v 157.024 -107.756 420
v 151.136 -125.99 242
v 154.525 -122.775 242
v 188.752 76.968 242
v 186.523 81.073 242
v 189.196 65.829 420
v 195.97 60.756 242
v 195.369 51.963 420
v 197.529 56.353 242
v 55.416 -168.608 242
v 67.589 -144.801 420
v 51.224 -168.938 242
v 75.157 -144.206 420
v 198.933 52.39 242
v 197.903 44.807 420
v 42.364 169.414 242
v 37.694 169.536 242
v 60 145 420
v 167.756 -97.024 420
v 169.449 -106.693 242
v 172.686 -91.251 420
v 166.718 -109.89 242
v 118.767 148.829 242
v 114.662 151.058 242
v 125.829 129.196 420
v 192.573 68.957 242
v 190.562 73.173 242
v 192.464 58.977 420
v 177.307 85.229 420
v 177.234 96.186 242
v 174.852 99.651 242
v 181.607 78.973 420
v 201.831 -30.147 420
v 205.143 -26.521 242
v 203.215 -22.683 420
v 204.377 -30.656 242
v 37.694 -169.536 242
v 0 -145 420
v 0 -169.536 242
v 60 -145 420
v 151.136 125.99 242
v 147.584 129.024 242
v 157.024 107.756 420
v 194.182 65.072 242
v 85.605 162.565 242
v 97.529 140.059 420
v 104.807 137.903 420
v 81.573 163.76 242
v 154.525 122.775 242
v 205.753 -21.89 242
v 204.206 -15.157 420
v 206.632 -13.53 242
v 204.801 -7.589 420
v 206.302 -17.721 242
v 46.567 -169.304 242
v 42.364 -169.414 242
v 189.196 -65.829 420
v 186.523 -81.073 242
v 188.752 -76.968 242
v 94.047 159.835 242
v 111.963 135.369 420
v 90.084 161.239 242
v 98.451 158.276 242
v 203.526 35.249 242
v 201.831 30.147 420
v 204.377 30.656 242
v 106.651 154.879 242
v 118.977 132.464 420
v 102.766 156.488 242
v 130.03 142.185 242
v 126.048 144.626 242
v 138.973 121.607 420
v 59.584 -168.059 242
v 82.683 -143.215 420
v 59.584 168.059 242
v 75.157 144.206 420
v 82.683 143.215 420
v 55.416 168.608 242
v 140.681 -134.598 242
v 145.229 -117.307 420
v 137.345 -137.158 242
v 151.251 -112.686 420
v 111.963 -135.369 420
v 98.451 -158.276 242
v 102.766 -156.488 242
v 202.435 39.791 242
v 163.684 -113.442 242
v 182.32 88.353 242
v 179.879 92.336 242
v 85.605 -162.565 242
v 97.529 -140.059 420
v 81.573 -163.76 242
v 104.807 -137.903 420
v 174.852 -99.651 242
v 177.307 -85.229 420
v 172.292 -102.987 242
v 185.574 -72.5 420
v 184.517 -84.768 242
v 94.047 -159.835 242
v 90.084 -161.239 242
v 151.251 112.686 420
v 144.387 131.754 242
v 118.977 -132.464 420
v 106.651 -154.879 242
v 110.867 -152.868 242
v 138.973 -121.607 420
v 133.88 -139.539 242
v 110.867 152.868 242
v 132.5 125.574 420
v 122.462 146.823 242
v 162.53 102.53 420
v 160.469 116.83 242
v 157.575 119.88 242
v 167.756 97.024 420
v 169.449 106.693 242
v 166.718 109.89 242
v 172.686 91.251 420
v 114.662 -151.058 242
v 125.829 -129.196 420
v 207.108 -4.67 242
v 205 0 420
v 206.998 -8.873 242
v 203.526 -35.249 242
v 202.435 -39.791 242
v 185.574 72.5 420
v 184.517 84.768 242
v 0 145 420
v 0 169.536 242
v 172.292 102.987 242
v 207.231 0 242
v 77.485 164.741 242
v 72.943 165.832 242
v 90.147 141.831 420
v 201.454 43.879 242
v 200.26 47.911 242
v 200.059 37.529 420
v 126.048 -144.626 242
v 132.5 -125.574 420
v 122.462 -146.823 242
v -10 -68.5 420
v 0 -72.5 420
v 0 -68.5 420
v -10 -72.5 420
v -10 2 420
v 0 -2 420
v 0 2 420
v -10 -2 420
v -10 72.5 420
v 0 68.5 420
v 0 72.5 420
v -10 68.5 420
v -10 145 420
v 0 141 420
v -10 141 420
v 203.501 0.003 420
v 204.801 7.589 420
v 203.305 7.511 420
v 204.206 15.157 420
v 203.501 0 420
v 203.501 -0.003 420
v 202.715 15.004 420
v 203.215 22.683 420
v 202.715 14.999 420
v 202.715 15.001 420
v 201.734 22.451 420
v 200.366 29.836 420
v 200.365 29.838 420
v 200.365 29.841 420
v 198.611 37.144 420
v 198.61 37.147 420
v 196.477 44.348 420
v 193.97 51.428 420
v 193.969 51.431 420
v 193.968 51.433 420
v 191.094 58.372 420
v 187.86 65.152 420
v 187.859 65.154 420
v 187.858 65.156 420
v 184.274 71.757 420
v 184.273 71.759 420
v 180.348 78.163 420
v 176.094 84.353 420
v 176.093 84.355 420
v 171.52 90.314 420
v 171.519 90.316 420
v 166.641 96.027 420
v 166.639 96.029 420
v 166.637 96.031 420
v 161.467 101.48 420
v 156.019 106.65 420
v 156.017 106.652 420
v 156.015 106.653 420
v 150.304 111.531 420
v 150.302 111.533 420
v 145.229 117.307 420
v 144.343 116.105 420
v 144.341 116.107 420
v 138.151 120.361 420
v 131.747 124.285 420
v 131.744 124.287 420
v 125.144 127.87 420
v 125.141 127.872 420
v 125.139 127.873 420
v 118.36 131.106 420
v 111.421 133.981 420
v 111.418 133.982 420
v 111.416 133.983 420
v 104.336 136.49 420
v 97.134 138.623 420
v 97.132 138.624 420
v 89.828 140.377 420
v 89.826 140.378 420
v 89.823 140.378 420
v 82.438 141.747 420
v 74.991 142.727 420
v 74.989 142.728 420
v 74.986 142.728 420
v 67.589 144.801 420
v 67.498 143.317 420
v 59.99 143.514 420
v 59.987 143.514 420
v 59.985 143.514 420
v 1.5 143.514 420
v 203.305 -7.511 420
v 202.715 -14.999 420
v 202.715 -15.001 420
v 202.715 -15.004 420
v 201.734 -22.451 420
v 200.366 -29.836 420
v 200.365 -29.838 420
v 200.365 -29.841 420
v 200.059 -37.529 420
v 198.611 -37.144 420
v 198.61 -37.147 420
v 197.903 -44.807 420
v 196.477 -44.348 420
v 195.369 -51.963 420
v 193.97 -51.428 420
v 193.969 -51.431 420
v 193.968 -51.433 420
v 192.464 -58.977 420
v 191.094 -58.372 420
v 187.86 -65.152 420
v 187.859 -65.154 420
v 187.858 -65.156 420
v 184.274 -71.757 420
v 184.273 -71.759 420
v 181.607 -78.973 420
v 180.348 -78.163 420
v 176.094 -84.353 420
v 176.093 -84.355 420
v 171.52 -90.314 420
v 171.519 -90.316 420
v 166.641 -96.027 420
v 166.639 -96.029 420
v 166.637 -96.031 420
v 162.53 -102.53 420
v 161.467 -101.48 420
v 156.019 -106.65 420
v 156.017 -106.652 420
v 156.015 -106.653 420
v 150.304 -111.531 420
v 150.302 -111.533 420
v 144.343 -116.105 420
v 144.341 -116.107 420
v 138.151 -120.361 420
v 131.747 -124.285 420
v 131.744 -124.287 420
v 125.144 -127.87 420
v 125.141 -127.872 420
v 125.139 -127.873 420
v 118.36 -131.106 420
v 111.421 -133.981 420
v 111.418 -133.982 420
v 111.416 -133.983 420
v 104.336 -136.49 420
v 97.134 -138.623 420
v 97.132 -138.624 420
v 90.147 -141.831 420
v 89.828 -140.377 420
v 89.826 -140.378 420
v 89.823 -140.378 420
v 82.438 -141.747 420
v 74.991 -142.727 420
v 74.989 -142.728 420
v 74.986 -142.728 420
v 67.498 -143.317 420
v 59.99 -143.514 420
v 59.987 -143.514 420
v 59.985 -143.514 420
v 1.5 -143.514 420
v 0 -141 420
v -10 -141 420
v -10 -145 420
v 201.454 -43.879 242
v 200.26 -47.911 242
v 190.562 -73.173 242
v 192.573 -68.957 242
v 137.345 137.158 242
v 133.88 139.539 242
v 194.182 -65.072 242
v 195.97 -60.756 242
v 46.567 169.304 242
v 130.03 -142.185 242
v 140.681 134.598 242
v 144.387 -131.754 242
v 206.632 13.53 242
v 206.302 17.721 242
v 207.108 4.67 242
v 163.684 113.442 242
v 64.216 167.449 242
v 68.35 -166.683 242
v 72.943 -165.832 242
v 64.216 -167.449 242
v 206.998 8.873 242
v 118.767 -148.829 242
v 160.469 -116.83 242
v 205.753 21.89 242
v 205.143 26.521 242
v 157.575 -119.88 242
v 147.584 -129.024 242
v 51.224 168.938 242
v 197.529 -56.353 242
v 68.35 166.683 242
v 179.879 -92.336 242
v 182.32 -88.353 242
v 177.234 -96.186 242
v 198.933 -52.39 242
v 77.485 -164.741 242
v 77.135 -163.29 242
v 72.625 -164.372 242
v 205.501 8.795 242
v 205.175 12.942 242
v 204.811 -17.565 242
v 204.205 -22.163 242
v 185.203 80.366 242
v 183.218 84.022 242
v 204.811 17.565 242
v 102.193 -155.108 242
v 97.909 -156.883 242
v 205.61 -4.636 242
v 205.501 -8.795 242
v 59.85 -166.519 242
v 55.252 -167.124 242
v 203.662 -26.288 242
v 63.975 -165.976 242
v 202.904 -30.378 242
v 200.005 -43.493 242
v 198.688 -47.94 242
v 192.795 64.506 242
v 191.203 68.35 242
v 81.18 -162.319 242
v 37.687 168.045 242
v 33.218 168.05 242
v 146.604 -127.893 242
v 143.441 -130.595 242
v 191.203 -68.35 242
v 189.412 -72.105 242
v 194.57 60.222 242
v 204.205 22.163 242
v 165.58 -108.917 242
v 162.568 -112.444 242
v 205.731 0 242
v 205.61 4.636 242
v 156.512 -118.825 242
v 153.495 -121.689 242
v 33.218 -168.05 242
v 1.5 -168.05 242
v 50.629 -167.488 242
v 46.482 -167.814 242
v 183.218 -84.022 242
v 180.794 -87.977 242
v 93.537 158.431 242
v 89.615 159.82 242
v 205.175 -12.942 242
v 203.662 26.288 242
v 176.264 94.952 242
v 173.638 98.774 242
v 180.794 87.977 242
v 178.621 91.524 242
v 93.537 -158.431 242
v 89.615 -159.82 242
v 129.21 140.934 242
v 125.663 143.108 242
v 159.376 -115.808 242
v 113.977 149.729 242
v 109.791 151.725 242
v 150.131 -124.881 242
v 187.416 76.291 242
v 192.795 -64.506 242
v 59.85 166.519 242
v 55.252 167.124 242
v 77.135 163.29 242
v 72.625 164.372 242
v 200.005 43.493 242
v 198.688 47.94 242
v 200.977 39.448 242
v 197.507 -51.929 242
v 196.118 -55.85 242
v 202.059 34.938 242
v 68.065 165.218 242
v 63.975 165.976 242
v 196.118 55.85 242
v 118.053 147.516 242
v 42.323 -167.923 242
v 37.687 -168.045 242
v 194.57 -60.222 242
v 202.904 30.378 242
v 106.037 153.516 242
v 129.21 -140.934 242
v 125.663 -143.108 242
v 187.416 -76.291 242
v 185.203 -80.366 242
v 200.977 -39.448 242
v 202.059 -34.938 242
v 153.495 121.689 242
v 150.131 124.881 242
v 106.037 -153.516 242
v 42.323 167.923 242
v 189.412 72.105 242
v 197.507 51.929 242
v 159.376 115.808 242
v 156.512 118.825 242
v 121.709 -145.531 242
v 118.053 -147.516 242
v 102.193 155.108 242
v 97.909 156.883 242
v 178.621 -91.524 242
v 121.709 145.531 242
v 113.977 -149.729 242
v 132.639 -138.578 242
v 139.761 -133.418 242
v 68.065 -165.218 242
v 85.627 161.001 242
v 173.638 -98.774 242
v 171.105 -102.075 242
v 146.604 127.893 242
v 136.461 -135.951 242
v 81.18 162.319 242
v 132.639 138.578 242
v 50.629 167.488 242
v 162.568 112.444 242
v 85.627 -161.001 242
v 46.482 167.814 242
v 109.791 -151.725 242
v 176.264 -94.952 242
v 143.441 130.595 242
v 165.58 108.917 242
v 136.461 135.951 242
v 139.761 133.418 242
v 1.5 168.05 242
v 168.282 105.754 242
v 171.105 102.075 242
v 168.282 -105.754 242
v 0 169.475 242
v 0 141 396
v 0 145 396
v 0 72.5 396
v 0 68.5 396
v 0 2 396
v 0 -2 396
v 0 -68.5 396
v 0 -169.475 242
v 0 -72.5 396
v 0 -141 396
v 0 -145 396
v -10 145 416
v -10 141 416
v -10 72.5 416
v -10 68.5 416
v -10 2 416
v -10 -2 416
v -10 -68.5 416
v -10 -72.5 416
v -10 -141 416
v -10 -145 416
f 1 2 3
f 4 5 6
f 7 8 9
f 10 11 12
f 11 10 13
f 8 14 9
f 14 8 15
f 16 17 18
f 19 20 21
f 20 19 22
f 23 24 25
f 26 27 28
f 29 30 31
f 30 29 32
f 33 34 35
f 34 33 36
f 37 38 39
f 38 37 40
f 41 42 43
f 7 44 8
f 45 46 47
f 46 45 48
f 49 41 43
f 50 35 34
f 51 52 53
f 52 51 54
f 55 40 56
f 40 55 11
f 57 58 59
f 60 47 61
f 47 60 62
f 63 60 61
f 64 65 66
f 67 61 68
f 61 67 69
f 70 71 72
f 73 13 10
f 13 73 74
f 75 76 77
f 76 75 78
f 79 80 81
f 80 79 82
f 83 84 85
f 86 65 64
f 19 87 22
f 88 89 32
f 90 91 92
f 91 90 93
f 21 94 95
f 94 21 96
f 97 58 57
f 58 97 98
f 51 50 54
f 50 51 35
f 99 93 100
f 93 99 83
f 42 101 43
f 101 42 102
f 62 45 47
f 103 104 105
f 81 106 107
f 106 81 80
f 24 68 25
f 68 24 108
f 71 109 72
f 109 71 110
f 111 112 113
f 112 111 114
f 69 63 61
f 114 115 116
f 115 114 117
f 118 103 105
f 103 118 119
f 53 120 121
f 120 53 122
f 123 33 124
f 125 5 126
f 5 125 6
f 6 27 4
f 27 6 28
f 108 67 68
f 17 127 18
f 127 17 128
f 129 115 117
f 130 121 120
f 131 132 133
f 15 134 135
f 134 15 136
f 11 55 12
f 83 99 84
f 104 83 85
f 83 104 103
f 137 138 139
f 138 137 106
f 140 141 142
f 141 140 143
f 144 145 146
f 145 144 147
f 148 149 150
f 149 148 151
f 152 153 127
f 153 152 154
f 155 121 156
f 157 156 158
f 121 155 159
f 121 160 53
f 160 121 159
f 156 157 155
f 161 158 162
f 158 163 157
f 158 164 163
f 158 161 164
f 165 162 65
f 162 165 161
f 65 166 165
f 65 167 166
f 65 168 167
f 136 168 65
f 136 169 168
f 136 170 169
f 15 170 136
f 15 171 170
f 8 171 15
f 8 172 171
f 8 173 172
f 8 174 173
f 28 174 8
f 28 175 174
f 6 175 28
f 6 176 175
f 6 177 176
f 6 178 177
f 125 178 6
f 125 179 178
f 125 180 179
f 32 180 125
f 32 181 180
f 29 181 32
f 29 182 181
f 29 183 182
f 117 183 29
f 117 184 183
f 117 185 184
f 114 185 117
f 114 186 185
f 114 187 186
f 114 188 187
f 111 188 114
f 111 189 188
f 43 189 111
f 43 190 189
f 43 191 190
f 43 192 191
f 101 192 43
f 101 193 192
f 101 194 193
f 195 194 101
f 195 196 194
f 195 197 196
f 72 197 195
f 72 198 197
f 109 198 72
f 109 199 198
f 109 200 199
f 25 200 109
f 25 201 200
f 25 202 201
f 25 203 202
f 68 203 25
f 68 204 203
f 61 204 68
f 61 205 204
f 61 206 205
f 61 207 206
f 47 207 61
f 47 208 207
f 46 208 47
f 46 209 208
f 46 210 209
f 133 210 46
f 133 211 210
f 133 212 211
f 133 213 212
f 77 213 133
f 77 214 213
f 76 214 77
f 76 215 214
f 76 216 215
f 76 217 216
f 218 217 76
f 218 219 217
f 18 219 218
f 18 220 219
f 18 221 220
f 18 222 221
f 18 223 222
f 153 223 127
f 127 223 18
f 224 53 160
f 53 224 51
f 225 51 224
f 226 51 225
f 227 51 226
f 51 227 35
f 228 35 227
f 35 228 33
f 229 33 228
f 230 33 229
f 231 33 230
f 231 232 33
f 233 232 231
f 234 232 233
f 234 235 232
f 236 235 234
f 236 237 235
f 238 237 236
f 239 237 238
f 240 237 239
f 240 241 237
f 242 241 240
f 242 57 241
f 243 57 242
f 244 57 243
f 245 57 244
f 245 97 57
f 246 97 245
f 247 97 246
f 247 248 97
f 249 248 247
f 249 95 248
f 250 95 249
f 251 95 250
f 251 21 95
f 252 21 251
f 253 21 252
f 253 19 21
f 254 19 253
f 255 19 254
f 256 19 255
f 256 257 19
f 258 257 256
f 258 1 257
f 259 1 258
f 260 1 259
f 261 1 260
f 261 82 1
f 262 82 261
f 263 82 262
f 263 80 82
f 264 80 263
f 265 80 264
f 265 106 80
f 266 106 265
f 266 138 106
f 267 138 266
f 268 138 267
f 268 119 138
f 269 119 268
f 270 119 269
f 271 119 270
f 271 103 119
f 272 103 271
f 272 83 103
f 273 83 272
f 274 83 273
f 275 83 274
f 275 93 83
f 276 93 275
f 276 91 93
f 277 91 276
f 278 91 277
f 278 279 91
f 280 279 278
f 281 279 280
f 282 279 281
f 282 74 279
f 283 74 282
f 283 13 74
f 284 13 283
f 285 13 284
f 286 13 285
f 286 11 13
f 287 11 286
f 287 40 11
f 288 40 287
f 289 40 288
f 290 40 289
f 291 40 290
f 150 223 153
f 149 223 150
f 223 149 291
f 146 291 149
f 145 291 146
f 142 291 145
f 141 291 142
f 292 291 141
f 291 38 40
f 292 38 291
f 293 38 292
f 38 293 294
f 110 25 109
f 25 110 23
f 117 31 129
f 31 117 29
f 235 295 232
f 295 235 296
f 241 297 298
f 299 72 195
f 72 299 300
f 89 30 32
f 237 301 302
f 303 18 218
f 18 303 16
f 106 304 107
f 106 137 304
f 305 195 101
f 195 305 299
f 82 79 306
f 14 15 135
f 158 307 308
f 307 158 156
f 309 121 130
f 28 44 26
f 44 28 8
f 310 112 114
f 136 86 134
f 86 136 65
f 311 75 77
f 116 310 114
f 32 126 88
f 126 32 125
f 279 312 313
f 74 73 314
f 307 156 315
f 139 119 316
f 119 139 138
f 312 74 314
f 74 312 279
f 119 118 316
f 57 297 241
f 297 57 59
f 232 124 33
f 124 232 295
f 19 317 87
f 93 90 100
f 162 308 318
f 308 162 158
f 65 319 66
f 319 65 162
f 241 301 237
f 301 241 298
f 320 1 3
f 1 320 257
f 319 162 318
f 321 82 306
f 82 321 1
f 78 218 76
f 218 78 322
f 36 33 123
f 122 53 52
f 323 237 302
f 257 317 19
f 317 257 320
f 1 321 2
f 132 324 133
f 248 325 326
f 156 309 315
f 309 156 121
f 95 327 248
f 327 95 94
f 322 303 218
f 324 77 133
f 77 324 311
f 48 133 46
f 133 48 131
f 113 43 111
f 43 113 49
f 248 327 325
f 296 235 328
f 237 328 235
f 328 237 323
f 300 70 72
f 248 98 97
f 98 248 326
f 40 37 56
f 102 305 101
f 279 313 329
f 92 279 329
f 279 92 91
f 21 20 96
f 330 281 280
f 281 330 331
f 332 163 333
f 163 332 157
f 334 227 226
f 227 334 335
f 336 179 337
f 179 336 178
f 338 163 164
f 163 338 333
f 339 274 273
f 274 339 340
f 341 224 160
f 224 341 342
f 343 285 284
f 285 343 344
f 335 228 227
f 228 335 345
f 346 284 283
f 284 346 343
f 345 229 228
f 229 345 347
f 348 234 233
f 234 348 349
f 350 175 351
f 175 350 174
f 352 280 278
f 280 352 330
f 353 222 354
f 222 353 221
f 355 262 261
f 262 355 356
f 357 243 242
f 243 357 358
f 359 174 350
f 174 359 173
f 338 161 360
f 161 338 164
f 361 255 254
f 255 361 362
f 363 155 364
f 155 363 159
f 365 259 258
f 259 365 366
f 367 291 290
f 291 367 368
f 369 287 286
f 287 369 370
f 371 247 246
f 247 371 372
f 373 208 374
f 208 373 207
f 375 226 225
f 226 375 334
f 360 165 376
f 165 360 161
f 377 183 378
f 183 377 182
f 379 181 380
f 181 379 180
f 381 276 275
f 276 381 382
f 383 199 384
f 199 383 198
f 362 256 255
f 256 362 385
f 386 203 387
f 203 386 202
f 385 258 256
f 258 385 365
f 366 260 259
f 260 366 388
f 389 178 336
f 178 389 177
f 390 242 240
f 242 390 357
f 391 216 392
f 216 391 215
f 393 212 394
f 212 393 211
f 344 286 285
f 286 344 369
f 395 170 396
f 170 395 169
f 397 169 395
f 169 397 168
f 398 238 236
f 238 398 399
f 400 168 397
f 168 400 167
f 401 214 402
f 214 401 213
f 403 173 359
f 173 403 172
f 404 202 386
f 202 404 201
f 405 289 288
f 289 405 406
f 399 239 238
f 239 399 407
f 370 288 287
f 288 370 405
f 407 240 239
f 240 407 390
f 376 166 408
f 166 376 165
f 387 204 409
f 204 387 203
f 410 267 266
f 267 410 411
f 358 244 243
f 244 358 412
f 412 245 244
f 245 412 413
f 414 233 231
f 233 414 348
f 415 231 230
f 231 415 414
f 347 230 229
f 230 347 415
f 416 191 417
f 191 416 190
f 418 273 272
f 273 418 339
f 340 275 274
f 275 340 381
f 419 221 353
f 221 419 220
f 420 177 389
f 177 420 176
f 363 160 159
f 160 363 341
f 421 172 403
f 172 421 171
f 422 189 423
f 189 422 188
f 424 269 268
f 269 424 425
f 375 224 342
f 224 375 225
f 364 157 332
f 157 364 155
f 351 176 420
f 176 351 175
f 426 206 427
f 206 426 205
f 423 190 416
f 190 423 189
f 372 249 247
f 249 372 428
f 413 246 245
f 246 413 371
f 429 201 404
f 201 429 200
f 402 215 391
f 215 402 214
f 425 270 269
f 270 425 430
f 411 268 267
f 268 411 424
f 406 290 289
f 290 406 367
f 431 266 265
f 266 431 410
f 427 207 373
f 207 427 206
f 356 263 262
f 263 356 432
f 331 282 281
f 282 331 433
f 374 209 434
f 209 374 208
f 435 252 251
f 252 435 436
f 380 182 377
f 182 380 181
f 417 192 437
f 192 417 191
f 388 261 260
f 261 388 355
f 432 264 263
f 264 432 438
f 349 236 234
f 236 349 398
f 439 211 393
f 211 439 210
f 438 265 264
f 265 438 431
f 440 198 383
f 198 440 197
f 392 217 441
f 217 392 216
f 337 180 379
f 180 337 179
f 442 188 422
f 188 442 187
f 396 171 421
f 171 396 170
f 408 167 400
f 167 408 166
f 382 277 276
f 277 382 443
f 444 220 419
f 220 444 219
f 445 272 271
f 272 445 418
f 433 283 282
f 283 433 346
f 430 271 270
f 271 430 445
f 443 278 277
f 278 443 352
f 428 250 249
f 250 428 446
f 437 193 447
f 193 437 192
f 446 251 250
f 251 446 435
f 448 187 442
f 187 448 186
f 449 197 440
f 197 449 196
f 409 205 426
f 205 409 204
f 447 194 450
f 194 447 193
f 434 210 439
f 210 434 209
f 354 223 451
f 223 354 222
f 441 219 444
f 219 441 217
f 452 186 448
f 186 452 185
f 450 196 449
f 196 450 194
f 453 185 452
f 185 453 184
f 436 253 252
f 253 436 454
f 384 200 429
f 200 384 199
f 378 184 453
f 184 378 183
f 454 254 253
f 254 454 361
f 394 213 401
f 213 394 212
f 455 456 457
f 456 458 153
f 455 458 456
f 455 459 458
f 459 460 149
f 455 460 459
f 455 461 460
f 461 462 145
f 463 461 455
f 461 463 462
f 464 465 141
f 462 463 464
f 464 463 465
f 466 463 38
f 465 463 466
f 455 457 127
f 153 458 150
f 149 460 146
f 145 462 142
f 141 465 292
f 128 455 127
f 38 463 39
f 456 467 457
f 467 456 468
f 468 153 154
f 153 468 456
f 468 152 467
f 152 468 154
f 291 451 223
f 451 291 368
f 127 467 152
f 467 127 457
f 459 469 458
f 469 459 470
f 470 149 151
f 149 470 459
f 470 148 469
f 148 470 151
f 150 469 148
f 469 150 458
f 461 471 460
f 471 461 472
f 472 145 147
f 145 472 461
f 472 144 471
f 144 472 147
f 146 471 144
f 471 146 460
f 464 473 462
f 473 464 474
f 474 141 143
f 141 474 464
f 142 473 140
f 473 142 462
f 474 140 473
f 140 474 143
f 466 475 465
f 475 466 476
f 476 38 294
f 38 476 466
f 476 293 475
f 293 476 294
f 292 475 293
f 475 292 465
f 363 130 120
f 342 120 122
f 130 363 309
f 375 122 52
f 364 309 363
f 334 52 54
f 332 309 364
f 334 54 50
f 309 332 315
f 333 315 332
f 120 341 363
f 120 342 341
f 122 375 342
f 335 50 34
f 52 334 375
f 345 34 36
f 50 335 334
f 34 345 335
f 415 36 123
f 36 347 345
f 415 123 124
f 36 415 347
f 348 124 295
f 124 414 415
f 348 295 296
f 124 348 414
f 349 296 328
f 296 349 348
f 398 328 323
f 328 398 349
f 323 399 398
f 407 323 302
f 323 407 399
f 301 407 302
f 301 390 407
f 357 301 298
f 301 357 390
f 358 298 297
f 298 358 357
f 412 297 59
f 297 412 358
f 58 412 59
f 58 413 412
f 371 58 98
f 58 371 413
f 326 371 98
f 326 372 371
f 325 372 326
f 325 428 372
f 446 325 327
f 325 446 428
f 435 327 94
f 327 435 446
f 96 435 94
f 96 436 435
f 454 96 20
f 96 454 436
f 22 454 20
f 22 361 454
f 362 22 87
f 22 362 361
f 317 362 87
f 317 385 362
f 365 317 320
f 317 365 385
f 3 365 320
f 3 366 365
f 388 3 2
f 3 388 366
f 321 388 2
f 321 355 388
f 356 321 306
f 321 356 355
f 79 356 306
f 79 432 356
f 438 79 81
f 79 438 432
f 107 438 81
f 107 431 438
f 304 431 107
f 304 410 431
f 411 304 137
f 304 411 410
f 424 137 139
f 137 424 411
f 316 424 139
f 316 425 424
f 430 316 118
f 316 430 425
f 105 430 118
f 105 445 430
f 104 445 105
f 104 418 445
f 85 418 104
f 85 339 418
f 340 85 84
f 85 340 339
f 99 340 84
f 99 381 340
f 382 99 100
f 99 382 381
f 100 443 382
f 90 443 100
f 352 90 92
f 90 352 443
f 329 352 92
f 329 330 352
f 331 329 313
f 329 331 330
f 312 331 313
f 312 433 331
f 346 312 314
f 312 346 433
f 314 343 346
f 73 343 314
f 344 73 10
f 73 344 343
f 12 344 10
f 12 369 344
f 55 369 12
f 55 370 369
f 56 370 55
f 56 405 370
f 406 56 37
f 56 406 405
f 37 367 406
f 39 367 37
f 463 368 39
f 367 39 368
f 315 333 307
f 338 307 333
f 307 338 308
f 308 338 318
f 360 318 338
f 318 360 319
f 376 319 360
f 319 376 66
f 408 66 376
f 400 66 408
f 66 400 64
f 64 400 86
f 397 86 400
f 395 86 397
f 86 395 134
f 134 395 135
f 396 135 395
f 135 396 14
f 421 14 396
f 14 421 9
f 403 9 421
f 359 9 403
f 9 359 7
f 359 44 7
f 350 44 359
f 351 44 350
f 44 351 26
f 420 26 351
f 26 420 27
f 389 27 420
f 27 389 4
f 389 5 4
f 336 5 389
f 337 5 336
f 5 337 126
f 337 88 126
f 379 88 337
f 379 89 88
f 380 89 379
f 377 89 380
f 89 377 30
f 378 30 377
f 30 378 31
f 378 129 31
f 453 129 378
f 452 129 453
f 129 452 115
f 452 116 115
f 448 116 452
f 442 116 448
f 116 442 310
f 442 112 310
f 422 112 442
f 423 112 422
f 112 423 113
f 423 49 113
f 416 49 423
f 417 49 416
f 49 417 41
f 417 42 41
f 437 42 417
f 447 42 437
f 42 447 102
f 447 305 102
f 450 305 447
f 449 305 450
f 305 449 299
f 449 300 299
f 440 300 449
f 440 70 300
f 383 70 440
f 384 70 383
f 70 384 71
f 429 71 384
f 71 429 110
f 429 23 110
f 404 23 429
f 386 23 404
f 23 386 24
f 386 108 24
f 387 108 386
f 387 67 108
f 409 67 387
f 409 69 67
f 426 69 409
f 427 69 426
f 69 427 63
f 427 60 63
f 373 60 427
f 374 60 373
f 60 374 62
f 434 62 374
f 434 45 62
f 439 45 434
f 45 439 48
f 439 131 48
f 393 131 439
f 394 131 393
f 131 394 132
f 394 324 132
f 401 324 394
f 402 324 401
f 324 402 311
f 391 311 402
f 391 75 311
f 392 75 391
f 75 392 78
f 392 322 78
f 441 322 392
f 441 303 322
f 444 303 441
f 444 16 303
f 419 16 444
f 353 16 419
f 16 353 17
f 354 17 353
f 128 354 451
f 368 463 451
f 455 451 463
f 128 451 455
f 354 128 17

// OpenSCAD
// Ruokasuppilo
// Copyright 2024 Heikki Suonsivu
// Licensed under Creative Commons CC-BY-NC-SA, see https://creativecommons.org/licenses/by-nc-sa/4.0/
// For commercial licensing, please contact directly, hsu-3d@suonsivu.net, +358 40 551 9679

versiontext="V1.1";
textdepth=0.8;
textsize=8;

suppiloupw=400;//350; //320;
suppiloupl=420;
suppilodownw=290; //225;
suppilodownl=410; //225;
suppiloinheight=400;//68; //400;  testing..
suppilooutheight=0;
suppilow=max(suppilodownl,suppiloupl,suppiloupw,suppilodownw);
wall=1.5;
hangtoph=20;
hangw=10; //+wall
hanglowerh=63+hangtoph;
hangspike=5;
hangback=3.8;
hangwidth=25;
hangspikewidth=5.5;
hangdistance=suppiloupw-2*hangwidth-2*hangwidth;
backhangdistance=hangw;//-1; // 1 mm for cloth
hookout=8;
hookh=10;
hookw=4;
hookheight=0;//suppilooutheight+12;
hookd=suppilodownw/2+(suppiloupw-suppilodownw)/2*(hookheight/(suppiloinheight+2*wall));
//hookd=suppilodownd/2+(suppiloupd-suppilodownd)/2*(hookheight/(suppiloinheight+2*wall));
//suppilooutd=suppilodownd/2+(suppiloupd-suppilodownd)/2*(suppilooutheight/suppiloinheight);
suppilomaxw=max(suppiloupw,suppilodownw)+hangw;
suppilomaxl=max(suppiloupl,suppilodownl);

totalheight=suppiloinheight+hangtoph;;

$fn=120;

module suppilo() {
  dup=min(suppiloupw,suppiloupl);
  mup=max(suppiloupw,suppiloupl);
  centerdistanceup = (dup>mup?dup-mup:0)/2;
  ddown=min(suppilodownw,suppilodownl);
  mdown=min(suppilodownw,suppilodownl);
  centerdistancedown = (ddown>mdown?ddown-mdown:0)/2;
  difference() {
    union() {
      hull() {
	translate([0,-centerdistanceup/2,suppiloinheight-1]) cylinder(h=1,d=dup);
	translate([suppiloupl/2-dup/2,0,suppiloinheight-1]) cylinder(h=1,d=dup);
	translate([0,centerdistanceup/2,suppiloinheight-1]) cylinder(h=1,d=dup);
	
	translate([0,-centerdistancedown/2,0]) cylinder(h=1,d=ddown);
	translate([suppilodownl/2-ddown/2,0,]) cylinder(h=1,d=ddown);
	translate([0,centerdistancedown/2,0]) cylinder(h=1,d=ddown);
	
	translate([0,-centerdistanceup/2,suppiloinheight-0.01]) cylinder(h=hangtoph,d=dup);
	translate([suppiloupl/2-dup/2,0,suppiloinheight-0.01]) cylinder(h=hangtoph,d=dup);
	translate([0,centerdistanceup/2,suppiloinheight-0.01]) cylinder(h=hangtoph,d=dup);
      }
    }

  hull() {
    translate([0,-centerdistanceup/2,suppiloinheight-1-0.1]) cylinder(h=1+0.2,d=dup-wall*2);
    translate([suppiloupl/2-dup/2,0,suppiloinheight-1-0.01]) cylinder(h=1+0.02,d=dup-wall*2);
    translate([0,centerdistanceup/2,suppiloinheight-1-0.1]) cylinder(h=1+0.2,d=dup-wall*2);
      
    translate([0,centerdistancedown/2,-0.1]) cylinder(h=1+0.2,d=ddown-wall*2);
    translate([suppilodownl/2-ddown/2,0,-0.1]) cylinder(h=1+0.2,d=ddown-wall*2);
    translate([0,-centerdistancedown/2,-0.1]) cylinder(h=1+0.2,d=ddown-wall*2);
    
    translate([0,-centerdistanceup/2,suppiloinheight-0.1]) cylinder(h=hangtoph+0.2,d=dup-wall*2);
    translate([suppiloupl/2-dup/2,0,suppiloinheight-0.1]) cylinder(h=hangtoph+0.2,d=dup-wall*2);
    translate([0,centerdistanceup/2,suppiloinheight-0.1]) cylinder(h=hangtoph+0.2,d=dup-wall*2);
  }
  translate([-suppilow/2-1,-suppilow/2-1,-0.1]) cube([suppilow/2+1,suppilow+2,suppiloinheight+hangtoph+0.2]);
  
    //if (0) hull() {
    //  translate([wall,-suppilodownd/2,-wall]) cube([wall,suppilodownd,wall]);
    //  translate([suppilooutd,-suppiloupd/2,suppilooutheight]) cube([wall,suppiloupd,wall]);
    //  translate([suppilooutd,-suppiloupd/2,0]) cube([wall,suppiloupd,wall]);
    //}
  }

  hull() {
    translate([0,-suppilodownw/2,0]) cube([wall,suppilodownw,wall]);
    translate([0,-suppiloupw/2,suppiloinheight]) cube([wall,suppiloupw,wall]);
  }

  translate([-hangw,-suppiloupw/2,suppiloinheight-0.01]) cube([hangw+0.01,wall,hangtoph]);
  translate([-hangw,suppiloupw/2-wall,suppiloinheight-0.01]) cube([hangw+0.01,wall,hangtoph]);
  hull() {
    translate([-hangw,-suppiloupw/2,suppiloinheight+hangtoph-wall]) cube([wall,suppiloupw,wall]);
    translate([0,-suppiloupw/2,suppiloinheight]) cube([wall,suppiloupw,wall]);
  }
difference() {
  hull() {
    translate([-hangw,-suppiloupw/2,suppiloinheight]) cube([hangback,suppiloupw,wall]);
    translate([-hangw,-suppiloupw/2,suppiloinheight+hangtoph-wall]) cube([wall,suppiloupw,wall]);
  }

    translate([-hangw+textdepth-0.01,0,suppiloinheight+hangtoph/2]) rotate([90,0,-90]) linear_extrude(height=textdepth) text(versiontext, size=textsize, valign="center",halign="center",font="Liberation Sans:style=Bold");
    
}

  hull() {
    translate([-hangw,-suppiloupw/2,suppiloinheight]) cube([hangw,(suppiloupw-hangdistance)/2-hangwidth,wall]);
    translate([0,-suppiloupw/2+hangw,suppiloinheight-hangtoph]) cube([wall,(suppiloupw-hangdistance)/2-hangwidth-hangw,wall]);
  }
  hull() {
    translate([-hangw,hangdistance/2+hangwidth,suppiloinheight]) cube([hangw,(suppiloupw-hangdistance)/2-hangwidth,wall]);
    translate([0,hangdistance/2+hangwidth,suppiloinheight-hangtoph]) cube([wall,(suppiloupw-hangdistance)/2-hangwidth-hangw,wall]);
  }
  hull() {
    translate([-hangw,-hangdistance/2,suppiloinheight]) cube([hangw,hangdistance,wall]);
    translate([0,-hangdistance/2,suppiloinheight-hangtoph]) cube([wall,hangdistance,wall]);
  }

  //if (0) for (angle=[-85,-45,0,45,85]) {
  //    rotate([0,0,angle]) {
  //  translate([hookd-0.1,-hookw/2,hookheight]) cube([hookout+0.1,hookw,hookw]);
  //  translate([hookd+hookout,-hookw/2,hookheight]) cube([hookw,hookw,hookh]);
  //  hull() {
  //	translate([hookd,-hookw/2,hookheight]) cube([hookw+hookout,hookw,1]);
  //	translate([suppilooutd-wall/2,-hookw/2,suppilooutheight+wall]) cube([0.1,hookw,0.1]);
  //  }
  //}
  //}

  for (y=[-suppilodownw/2,-suppilodownw/4,-hookw/2,suppilodownw/4-hookw,suppilodownw/2-hookw]) {
    hull() {
      translate([-backhangdistance,y,hookheight]) cube([backhangdistance+0.1,hookw,hookw]);
      translate([0,y,hookheight+2*backhangdistance]) cube([wall,hookw,hookw]);
    }
    if (0) {
      translate([-backhangdistance,y,hookheight]) cube([hookw,hookw,hookh]);
      hull() {
	translate([-backhangdistance,y,hookheight]) cube([backhangdistance+0.1,hookw,1]);
	translate([0,y,suppilooutheight+wall]) cube([0.1,hookw,0.1]);
      }
    }
  }
}


intersection() {
  translate([0,0,totalheight]) rotate([180,0,0]) suppilo();
  translate([-suppilomaxw/2-1,-suppilomaxl/2-1,242]) cube([suppilomaxw+5,suppilomaxl+5,totalheight-242+1]);
}
